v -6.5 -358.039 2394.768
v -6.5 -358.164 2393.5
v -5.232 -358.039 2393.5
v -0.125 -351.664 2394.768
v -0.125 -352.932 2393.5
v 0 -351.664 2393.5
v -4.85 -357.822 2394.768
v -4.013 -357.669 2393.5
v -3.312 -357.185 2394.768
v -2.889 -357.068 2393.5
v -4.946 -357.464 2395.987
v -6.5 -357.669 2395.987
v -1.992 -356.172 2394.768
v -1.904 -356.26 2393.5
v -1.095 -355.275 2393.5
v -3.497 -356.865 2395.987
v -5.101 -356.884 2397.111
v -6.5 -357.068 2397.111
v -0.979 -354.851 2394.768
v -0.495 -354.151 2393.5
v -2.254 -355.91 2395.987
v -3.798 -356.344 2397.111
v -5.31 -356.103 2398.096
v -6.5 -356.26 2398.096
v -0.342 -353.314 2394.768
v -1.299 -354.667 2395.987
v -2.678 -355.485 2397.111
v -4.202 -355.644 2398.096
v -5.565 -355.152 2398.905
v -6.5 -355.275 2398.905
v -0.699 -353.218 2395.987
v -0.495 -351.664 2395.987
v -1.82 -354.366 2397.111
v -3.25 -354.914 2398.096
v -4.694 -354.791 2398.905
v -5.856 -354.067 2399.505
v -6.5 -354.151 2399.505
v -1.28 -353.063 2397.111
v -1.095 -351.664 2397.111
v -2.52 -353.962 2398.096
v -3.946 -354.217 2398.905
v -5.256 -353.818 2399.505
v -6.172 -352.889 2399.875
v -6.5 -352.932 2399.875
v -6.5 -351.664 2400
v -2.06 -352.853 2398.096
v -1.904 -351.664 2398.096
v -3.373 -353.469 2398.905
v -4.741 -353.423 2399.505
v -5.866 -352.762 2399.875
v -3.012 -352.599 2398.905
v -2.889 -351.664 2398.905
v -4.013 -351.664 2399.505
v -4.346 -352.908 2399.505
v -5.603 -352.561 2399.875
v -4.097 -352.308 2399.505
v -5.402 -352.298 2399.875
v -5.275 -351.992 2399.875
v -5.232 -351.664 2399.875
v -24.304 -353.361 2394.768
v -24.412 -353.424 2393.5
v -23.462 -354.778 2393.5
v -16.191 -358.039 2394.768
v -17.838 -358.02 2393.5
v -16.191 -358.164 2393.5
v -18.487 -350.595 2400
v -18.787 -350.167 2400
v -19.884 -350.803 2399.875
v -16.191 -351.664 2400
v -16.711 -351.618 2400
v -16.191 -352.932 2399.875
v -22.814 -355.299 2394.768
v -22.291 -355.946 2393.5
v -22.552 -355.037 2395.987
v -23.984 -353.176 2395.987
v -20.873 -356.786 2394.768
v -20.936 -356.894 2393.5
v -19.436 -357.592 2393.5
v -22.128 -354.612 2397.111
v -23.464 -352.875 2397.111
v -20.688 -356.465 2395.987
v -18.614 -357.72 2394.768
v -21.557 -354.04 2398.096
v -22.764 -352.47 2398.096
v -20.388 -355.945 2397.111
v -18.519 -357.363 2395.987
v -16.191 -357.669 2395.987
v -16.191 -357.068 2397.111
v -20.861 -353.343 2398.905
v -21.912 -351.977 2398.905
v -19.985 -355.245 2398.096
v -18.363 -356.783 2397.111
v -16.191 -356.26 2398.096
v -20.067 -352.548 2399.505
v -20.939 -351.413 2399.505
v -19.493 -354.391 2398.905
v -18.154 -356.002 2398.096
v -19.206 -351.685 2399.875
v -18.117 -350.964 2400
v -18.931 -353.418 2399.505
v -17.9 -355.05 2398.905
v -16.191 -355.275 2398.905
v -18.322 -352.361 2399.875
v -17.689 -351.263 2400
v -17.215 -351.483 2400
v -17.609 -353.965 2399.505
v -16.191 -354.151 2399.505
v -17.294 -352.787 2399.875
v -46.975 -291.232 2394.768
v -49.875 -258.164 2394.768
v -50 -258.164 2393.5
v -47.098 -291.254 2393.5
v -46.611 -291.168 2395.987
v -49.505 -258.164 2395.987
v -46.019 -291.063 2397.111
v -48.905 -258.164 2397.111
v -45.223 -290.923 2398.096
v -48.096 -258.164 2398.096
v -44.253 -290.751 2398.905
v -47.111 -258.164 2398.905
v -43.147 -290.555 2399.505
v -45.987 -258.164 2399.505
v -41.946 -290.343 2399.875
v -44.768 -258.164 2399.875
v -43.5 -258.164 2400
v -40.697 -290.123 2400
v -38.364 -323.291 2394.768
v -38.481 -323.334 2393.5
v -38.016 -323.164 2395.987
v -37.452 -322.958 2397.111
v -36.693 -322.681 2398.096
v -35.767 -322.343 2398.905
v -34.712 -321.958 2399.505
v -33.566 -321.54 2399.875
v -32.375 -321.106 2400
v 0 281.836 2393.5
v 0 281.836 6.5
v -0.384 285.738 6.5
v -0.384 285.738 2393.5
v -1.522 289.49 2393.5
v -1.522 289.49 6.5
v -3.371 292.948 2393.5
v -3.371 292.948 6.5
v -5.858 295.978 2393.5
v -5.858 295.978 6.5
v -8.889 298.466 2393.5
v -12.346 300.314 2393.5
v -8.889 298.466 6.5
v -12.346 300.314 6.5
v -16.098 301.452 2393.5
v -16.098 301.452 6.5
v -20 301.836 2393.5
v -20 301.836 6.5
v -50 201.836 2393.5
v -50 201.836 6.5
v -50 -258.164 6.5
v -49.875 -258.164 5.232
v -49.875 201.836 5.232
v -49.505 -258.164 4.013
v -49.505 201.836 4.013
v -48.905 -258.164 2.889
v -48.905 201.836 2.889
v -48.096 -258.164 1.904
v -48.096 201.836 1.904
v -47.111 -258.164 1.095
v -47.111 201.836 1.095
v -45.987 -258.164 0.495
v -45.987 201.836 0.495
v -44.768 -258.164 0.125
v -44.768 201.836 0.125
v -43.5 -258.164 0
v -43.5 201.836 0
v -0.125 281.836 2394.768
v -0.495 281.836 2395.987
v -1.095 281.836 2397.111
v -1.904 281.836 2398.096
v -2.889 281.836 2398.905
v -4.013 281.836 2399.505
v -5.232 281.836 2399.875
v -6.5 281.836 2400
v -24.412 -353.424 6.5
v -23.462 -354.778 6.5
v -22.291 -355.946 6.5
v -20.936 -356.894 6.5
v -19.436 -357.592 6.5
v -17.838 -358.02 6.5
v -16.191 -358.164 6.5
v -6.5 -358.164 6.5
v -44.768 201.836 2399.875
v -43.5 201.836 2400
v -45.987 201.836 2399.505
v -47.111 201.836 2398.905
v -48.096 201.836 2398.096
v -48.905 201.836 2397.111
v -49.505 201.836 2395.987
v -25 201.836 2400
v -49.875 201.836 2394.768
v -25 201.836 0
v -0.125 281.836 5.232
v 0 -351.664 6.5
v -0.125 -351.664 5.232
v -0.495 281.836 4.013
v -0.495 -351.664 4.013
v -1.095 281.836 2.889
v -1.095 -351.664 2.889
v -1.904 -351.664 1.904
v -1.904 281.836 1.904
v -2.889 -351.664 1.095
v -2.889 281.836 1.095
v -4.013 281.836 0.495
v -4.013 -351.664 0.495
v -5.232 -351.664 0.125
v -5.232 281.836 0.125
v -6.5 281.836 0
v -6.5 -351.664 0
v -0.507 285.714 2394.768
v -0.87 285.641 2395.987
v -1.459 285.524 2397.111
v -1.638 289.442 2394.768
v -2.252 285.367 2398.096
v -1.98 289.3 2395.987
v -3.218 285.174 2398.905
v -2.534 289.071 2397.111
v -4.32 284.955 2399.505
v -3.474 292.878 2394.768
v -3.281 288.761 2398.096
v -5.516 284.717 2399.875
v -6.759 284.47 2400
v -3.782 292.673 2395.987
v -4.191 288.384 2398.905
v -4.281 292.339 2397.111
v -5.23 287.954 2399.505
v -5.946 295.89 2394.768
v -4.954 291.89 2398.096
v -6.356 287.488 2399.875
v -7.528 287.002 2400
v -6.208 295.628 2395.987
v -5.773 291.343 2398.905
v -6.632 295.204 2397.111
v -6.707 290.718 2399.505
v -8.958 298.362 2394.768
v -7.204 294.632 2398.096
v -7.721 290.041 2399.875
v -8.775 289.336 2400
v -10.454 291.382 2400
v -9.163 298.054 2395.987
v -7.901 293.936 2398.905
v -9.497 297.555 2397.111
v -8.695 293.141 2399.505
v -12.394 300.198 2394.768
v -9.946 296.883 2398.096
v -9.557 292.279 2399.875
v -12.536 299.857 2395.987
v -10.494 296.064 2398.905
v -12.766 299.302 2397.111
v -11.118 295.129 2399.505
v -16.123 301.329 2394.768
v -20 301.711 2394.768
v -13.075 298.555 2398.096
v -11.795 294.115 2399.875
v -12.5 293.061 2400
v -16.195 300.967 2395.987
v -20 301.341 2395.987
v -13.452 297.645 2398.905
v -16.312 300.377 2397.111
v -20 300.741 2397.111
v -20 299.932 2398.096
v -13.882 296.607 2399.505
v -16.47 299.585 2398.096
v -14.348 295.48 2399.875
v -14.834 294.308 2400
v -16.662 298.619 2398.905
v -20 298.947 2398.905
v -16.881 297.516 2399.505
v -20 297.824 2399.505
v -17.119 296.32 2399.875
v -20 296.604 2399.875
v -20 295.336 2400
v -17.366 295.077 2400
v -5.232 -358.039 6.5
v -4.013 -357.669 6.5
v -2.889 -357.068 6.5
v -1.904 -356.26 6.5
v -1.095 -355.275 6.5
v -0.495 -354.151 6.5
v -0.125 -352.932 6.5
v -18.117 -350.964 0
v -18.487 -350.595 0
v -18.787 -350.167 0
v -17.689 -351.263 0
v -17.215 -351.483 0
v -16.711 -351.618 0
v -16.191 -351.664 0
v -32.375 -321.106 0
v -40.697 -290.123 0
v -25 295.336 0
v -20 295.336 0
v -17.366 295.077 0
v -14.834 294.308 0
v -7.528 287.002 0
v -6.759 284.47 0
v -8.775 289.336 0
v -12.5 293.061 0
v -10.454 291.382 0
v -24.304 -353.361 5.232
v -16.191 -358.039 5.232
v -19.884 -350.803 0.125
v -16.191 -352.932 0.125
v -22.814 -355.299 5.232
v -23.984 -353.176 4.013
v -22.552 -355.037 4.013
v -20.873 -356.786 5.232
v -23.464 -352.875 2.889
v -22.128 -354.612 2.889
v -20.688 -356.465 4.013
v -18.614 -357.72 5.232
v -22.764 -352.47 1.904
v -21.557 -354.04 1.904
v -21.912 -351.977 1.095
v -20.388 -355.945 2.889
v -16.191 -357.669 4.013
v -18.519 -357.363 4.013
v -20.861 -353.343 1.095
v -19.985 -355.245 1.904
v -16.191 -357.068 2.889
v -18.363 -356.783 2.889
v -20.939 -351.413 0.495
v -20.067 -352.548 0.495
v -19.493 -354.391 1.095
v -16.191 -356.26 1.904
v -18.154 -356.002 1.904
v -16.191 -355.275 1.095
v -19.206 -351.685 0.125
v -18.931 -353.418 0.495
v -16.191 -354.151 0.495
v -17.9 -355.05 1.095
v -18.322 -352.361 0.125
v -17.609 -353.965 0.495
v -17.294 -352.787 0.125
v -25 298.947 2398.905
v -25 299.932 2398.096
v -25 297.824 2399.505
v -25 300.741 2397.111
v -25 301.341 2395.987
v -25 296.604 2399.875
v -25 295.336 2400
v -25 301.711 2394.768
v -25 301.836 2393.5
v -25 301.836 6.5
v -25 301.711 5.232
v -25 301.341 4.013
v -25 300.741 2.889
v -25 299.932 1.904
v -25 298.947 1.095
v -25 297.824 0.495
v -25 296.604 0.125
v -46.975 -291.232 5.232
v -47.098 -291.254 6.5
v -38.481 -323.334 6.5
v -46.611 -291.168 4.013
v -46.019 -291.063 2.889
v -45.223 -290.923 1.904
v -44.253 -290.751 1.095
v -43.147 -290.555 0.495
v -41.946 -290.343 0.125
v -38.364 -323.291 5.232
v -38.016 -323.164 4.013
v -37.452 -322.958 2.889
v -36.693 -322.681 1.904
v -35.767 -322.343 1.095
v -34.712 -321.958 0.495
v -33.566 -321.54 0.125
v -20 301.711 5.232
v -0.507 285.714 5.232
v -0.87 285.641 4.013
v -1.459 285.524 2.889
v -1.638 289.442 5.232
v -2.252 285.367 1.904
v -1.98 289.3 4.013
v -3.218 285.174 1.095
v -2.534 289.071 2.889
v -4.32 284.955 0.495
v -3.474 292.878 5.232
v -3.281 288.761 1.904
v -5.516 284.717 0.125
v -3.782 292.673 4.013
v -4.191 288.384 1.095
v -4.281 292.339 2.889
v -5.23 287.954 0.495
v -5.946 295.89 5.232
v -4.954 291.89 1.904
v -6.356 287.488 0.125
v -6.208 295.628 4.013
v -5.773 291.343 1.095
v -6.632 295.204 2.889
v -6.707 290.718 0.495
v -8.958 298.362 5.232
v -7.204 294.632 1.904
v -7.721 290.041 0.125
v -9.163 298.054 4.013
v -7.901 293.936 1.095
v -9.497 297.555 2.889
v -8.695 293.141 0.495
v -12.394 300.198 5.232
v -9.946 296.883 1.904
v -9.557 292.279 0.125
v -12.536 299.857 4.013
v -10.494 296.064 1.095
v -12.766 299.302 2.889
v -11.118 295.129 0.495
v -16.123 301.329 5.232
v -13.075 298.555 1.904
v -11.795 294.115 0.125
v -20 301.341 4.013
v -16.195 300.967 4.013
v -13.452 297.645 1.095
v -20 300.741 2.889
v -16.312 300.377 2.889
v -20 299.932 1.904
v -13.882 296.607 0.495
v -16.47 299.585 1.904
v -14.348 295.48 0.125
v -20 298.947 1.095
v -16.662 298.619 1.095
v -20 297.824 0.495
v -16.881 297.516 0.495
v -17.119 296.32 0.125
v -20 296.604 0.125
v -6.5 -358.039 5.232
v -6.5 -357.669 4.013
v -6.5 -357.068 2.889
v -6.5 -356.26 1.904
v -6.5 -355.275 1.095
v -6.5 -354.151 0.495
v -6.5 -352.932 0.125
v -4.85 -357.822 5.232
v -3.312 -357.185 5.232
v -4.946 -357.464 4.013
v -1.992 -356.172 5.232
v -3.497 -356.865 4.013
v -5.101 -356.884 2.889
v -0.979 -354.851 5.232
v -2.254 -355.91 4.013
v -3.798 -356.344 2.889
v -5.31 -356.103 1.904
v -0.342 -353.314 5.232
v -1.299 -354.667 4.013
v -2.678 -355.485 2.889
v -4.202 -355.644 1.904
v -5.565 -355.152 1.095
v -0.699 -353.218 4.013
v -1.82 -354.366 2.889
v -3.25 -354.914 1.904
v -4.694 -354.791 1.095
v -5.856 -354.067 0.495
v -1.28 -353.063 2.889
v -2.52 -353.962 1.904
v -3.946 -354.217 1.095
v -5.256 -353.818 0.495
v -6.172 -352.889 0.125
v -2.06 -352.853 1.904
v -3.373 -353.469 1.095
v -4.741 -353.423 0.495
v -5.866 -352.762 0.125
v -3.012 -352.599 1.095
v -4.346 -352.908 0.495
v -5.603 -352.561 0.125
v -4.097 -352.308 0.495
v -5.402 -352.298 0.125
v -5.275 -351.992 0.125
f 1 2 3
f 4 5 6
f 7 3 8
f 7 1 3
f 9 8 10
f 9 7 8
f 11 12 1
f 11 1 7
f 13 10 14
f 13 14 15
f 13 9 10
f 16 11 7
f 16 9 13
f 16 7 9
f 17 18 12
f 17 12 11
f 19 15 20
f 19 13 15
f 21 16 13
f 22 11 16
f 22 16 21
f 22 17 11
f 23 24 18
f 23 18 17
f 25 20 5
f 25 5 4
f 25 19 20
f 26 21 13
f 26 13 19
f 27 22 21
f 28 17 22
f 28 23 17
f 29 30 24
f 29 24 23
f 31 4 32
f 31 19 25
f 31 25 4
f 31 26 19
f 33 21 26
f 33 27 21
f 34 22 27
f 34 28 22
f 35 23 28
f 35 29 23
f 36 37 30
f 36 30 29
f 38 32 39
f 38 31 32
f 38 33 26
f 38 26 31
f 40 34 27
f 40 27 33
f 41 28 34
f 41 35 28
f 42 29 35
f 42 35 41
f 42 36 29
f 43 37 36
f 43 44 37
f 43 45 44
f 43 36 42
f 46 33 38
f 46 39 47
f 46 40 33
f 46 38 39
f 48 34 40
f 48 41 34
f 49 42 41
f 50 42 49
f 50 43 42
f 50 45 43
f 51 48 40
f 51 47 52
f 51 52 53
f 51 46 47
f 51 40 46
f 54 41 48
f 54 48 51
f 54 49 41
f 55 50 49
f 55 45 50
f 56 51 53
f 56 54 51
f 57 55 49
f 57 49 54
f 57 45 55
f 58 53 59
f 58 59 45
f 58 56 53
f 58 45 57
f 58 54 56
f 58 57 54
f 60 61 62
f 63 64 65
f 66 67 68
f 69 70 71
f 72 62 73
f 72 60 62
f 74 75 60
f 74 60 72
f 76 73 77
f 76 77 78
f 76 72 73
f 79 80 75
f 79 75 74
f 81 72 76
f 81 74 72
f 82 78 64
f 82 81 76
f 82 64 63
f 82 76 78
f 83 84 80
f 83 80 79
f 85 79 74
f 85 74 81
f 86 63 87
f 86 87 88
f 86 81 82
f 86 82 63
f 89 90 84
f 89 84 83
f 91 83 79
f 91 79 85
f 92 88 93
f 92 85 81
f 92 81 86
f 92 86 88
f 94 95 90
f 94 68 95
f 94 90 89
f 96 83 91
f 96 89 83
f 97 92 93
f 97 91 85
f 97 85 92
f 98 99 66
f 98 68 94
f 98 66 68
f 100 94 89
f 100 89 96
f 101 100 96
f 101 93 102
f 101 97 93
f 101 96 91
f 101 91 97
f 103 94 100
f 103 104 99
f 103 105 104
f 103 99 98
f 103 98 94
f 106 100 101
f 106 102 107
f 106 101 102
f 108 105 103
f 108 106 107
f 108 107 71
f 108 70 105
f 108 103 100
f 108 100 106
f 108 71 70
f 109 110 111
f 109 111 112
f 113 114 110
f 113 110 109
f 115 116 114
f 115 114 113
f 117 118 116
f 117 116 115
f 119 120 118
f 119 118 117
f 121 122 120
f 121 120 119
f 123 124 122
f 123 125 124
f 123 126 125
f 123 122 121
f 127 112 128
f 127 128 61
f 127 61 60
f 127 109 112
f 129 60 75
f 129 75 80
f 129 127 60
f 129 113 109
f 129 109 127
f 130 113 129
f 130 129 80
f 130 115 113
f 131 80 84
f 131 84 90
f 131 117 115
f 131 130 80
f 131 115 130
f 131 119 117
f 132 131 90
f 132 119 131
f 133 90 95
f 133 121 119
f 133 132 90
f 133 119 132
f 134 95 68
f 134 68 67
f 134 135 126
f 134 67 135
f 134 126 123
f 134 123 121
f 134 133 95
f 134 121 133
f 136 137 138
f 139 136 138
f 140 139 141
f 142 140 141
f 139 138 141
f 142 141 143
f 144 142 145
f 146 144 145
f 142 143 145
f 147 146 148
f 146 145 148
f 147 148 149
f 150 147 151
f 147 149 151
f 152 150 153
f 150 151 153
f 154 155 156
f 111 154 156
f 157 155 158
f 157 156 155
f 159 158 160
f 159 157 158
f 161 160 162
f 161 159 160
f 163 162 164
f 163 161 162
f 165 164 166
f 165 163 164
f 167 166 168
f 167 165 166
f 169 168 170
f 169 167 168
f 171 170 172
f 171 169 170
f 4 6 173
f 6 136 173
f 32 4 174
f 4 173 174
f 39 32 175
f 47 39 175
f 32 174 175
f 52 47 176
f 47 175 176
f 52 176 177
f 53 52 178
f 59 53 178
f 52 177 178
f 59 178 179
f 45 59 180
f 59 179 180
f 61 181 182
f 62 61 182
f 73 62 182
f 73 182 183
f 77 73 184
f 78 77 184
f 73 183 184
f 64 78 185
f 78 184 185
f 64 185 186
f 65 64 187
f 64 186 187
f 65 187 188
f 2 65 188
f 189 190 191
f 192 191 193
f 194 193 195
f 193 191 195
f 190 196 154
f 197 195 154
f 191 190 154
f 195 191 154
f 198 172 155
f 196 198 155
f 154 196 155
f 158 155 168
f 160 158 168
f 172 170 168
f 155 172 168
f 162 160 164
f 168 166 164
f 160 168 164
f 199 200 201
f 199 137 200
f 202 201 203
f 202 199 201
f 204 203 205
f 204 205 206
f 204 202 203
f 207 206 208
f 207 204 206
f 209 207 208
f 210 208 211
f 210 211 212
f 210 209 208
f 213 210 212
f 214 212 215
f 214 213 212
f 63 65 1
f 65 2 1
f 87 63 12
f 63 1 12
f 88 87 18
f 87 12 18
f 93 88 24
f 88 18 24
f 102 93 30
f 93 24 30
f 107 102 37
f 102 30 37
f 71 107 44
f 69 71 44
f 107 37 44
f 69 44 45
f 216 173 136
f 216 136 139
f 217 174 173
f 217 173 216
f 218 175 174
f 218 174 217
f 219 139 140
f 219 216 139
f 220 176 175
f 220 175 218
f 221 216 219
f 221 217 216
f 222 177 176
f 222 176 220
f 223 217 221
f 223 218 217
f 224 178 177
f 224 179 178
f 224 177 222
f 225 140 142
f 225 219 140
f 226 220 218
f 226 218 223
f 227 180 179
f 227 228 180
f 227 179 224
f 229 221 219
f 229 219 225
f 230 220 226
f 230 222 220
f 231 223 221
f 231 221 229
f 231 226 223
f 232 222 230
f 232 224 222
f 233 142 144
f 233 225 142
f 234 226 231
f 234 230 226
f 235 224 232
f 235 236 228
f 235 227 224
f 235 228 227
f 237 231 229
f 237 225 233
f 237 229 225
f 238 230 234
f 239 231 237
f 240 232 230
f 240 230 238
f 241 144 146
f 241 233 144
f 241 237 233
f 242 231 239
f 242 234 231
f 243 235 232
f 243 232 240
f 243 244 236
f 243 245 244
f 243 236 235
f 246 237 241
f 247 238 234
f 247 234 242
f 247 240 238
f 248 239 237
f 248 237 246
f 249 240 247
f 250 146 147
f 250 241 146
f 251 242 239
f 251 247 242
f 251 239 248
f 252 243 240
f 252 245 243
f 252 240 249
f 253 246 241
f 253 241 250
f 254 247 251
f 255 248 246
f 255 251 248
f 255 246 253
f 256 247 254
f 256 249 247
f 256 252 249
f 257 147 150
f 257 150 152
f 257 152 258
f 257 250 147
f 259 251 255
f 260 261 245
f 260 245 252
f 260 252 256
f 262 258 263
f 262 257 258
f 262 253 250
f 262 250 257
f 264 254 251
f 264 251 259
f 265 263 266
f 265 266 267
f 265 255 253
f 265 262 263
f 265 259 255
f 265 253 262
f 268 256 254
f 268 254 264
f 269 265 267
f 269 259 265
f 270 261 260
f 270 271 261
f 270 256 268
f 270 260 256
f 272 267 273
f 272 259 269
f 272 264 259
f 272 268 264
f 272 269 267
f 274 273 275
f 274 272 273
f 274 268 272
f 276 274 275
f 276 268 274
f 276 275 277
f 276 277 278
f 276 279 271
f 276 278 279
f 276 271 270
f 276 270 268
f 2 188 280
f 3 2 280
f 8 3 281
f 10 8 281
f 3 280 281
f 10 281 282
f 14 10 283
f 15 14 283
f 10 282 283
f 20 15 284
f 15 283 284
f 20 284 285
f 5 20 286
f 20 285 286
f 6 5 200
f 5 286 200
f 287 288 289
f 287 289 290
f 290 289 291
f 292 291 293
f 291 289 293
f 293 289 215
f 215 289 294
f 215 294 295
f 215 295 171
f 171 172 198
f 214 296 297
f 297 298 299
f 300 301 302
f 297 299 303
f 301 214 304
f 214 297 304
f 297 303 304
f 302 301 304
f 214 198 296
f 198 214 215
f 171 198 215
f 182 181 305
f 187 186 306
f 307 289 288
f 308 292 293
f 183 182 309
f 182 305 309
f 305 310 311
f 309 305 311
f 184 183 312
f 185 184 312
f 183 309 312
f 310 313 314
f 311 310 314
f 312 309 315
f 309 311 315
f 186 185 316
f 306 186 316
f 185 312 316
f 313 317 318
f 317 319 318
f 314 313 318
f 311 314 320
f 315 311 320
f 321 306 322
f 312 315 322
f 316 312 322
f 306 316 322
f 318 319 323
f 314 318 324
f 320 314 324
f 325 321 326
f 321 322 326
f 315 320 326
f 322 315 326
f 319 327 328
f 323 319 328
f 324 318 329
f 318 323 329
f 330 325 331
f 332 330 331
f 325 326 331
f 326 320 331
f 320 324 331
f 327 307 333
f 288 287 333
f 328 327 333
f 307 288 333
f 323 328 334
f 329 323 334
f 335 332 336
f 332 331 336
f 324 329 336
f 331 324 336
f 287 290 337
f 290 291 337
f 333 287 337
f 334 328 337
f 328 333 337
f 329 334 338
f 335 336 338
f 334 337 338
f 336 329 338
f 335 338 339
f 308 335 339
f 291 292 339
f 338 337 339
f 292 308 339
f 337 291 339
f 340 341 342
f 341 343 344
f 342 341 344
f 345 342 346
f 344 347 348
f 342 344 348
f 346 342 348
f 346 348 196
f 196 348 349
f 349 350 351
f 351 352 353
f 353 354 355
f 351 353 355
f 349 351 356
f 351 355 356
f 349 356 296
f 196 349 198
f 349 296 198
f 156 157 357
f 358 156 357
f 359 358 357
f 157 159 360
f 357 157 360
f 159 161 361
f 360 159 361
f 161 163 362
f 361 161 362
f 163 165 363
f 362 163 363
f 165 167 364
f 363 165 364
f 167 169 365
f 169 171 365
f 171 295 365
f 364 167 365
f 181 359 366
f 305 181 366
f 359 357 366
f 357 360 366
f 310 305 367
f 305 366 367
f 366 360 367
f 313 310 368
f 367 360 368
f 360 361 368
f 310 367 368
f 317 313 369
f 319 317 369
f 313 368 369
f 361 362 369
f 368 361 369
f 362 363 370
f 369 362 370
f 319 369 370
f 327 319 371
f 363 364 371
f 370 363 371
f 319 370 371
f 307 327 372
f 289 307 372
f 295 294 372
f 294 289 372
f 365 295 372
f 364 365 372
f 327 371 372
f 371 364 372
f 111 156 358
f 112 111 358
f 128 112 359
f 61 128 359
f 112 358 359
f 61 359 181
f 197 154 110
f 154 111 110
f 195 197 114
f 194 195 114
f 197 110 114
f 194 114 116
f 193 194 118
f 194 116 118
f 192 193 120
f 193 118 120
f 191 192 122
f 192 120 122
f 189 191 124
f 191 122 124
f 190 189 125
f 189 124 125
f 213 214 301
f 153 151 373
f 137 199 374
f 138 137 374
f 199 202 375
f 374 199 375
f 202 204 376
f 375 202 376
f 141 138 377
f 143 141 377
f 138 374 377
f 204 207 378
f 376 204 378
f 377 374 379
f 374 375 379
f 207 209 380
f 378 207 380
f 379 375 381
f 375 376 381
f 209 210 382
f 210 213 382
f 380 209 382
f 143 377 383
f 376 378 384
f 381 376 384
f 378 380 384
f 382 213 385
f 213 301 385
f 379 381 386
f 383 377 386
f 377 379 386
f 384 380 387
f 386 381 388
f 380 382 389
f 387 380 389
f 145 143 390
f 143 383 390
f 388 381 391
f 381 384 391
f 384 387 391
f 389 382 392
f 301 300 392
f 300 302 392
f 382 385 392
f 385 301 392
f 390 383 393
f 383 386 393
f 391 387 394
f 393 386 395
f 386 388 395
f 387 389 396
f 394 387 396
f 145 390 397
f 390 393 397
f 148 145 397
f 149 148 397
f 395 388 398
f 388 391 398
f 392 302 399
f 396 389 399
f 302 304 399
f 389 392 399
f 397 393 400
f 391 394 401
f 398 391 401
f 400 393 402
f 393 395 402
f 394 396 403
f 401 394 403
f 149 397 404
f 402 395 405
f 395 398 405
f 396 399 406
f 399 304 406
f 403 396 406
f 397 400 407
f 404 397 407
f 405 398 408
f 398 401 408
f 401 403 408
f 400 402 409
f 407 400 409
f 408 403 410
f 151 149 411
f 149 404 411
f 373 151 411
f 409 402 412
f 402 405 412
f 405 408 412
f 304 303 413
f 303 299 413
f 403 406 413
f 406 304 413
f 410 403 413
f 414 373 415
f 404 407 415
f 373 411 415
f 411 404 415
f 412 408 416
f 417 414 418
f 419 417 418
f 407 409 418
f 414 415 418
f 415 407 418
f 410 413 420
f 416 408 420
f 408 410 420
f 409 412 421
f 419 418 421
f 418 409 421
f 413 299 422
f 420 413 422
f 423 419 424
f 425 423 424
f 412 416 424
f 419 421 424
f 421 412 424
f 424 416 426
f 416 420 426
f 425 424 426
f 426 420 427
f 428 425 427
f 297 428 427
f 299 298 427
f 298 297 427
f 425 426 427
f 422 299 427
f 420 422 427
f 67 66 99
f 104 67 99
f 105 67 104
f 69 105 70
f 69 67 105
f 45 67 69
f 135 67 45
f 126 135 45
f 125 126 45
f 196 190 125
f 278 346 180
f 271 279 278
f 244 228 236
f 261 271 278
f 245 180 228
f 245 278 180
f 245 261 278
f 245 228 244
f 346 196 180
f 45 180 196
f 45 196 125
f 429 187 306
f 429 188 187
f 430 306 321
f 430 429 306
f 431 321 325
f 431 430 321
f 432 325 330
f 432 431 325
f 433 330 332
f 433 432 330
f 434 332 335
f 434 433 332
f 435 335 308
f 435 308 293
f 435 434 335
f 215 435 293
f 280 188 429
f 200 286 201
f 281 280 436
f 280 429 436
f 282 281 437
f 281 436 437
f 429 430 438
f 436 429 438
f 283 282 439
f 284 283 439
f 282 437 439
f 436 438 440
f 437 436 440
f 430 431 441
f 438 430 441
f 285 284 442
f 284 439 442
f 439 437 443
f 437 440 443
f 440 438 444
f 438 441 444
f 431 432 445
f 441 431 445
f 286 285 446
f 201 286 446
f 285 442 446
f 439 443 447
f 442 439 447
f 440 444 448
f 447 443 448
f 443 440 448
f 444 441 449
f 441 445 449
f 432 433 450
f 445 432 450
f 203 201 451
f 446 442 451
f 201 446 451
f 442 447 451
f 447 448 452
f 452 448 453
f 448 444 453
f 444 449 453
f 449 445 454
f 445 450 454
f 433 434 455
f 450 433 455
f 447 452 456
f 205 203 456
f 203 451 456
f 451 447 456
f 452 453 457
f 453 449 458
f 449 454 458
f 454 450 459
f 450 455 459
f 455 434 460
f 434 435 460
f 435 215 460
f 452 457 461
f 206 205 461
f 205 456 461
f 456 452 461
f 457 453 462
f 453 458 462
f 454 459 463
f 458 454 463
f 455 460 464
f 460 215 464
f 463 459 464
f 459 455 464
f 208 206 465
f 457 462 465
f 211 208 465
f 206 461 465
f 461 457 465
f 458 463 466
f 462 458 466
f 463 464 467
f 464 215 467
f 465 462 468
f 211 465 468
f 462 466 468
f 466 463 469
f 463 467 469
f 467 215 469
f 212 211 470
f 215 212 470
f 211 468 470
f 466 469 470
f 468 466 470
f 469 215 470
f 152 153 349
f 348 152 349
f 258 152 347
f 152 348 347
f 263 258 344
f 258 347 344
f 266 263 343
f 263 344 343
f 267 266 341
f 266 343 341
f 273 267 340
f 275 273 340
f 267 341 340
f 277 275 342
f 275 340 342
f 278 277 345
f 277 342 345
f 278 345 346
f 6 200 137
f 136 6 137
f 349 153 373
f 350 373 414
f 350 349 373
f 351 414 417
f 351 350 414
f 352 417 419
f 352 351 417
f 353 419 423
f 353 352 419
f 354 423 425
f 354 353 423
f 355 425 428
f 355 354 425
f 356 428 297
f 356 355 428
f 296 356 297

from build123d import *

# Parameters (mm, degrees)
F1_DEPTH = 2400
F2_R     = 6.5


with BuildPart() as f1:
    # F0 (on Top) → F1 (new body)
    with BuildSketch(Plane.XY):
        with BuildLine():
            Line((-20, 301.836108), (-25, 301.836108))
            Line((-25, 301.836108), (-25, 201.836108))
            Line((-25, 201.836108), (-50, 201.836108))
            Line((-50, 201.836108), (-50, -258.163892))
            ThreePointArc((-50, -258.163892), (-43.491581, -307.48237), (-24.411949, -353.424066))
            ThreePointArc((-24.411949, -353.424066), (-20.9355, -356.89407), (-16.19059, -358.163892))
            Line((-16.19059, -358.163892), (-6.5, -358.163892))
            ThreePointArc((-6.5, -358.163892), (-1.903806, -356.260086), (0, -351.663892))
            Line((0, -351.663892), (0, 281.836108))
            ThreePointArc((0, 281.836108), (-5.857864, 295.978244), (-20, 301.836108))
        make_face()
    extrude(amount=F1_DEPTH)

    # F2
    f2_edges = [f1.edges().sort_by_distance(p)[0] for p in [
        (-50, -28.163892, 2400),
        (-50, -28.163892, 0),
    ]]
    fillet(f2_edges, radius=F2_R)


solid = f1.part
